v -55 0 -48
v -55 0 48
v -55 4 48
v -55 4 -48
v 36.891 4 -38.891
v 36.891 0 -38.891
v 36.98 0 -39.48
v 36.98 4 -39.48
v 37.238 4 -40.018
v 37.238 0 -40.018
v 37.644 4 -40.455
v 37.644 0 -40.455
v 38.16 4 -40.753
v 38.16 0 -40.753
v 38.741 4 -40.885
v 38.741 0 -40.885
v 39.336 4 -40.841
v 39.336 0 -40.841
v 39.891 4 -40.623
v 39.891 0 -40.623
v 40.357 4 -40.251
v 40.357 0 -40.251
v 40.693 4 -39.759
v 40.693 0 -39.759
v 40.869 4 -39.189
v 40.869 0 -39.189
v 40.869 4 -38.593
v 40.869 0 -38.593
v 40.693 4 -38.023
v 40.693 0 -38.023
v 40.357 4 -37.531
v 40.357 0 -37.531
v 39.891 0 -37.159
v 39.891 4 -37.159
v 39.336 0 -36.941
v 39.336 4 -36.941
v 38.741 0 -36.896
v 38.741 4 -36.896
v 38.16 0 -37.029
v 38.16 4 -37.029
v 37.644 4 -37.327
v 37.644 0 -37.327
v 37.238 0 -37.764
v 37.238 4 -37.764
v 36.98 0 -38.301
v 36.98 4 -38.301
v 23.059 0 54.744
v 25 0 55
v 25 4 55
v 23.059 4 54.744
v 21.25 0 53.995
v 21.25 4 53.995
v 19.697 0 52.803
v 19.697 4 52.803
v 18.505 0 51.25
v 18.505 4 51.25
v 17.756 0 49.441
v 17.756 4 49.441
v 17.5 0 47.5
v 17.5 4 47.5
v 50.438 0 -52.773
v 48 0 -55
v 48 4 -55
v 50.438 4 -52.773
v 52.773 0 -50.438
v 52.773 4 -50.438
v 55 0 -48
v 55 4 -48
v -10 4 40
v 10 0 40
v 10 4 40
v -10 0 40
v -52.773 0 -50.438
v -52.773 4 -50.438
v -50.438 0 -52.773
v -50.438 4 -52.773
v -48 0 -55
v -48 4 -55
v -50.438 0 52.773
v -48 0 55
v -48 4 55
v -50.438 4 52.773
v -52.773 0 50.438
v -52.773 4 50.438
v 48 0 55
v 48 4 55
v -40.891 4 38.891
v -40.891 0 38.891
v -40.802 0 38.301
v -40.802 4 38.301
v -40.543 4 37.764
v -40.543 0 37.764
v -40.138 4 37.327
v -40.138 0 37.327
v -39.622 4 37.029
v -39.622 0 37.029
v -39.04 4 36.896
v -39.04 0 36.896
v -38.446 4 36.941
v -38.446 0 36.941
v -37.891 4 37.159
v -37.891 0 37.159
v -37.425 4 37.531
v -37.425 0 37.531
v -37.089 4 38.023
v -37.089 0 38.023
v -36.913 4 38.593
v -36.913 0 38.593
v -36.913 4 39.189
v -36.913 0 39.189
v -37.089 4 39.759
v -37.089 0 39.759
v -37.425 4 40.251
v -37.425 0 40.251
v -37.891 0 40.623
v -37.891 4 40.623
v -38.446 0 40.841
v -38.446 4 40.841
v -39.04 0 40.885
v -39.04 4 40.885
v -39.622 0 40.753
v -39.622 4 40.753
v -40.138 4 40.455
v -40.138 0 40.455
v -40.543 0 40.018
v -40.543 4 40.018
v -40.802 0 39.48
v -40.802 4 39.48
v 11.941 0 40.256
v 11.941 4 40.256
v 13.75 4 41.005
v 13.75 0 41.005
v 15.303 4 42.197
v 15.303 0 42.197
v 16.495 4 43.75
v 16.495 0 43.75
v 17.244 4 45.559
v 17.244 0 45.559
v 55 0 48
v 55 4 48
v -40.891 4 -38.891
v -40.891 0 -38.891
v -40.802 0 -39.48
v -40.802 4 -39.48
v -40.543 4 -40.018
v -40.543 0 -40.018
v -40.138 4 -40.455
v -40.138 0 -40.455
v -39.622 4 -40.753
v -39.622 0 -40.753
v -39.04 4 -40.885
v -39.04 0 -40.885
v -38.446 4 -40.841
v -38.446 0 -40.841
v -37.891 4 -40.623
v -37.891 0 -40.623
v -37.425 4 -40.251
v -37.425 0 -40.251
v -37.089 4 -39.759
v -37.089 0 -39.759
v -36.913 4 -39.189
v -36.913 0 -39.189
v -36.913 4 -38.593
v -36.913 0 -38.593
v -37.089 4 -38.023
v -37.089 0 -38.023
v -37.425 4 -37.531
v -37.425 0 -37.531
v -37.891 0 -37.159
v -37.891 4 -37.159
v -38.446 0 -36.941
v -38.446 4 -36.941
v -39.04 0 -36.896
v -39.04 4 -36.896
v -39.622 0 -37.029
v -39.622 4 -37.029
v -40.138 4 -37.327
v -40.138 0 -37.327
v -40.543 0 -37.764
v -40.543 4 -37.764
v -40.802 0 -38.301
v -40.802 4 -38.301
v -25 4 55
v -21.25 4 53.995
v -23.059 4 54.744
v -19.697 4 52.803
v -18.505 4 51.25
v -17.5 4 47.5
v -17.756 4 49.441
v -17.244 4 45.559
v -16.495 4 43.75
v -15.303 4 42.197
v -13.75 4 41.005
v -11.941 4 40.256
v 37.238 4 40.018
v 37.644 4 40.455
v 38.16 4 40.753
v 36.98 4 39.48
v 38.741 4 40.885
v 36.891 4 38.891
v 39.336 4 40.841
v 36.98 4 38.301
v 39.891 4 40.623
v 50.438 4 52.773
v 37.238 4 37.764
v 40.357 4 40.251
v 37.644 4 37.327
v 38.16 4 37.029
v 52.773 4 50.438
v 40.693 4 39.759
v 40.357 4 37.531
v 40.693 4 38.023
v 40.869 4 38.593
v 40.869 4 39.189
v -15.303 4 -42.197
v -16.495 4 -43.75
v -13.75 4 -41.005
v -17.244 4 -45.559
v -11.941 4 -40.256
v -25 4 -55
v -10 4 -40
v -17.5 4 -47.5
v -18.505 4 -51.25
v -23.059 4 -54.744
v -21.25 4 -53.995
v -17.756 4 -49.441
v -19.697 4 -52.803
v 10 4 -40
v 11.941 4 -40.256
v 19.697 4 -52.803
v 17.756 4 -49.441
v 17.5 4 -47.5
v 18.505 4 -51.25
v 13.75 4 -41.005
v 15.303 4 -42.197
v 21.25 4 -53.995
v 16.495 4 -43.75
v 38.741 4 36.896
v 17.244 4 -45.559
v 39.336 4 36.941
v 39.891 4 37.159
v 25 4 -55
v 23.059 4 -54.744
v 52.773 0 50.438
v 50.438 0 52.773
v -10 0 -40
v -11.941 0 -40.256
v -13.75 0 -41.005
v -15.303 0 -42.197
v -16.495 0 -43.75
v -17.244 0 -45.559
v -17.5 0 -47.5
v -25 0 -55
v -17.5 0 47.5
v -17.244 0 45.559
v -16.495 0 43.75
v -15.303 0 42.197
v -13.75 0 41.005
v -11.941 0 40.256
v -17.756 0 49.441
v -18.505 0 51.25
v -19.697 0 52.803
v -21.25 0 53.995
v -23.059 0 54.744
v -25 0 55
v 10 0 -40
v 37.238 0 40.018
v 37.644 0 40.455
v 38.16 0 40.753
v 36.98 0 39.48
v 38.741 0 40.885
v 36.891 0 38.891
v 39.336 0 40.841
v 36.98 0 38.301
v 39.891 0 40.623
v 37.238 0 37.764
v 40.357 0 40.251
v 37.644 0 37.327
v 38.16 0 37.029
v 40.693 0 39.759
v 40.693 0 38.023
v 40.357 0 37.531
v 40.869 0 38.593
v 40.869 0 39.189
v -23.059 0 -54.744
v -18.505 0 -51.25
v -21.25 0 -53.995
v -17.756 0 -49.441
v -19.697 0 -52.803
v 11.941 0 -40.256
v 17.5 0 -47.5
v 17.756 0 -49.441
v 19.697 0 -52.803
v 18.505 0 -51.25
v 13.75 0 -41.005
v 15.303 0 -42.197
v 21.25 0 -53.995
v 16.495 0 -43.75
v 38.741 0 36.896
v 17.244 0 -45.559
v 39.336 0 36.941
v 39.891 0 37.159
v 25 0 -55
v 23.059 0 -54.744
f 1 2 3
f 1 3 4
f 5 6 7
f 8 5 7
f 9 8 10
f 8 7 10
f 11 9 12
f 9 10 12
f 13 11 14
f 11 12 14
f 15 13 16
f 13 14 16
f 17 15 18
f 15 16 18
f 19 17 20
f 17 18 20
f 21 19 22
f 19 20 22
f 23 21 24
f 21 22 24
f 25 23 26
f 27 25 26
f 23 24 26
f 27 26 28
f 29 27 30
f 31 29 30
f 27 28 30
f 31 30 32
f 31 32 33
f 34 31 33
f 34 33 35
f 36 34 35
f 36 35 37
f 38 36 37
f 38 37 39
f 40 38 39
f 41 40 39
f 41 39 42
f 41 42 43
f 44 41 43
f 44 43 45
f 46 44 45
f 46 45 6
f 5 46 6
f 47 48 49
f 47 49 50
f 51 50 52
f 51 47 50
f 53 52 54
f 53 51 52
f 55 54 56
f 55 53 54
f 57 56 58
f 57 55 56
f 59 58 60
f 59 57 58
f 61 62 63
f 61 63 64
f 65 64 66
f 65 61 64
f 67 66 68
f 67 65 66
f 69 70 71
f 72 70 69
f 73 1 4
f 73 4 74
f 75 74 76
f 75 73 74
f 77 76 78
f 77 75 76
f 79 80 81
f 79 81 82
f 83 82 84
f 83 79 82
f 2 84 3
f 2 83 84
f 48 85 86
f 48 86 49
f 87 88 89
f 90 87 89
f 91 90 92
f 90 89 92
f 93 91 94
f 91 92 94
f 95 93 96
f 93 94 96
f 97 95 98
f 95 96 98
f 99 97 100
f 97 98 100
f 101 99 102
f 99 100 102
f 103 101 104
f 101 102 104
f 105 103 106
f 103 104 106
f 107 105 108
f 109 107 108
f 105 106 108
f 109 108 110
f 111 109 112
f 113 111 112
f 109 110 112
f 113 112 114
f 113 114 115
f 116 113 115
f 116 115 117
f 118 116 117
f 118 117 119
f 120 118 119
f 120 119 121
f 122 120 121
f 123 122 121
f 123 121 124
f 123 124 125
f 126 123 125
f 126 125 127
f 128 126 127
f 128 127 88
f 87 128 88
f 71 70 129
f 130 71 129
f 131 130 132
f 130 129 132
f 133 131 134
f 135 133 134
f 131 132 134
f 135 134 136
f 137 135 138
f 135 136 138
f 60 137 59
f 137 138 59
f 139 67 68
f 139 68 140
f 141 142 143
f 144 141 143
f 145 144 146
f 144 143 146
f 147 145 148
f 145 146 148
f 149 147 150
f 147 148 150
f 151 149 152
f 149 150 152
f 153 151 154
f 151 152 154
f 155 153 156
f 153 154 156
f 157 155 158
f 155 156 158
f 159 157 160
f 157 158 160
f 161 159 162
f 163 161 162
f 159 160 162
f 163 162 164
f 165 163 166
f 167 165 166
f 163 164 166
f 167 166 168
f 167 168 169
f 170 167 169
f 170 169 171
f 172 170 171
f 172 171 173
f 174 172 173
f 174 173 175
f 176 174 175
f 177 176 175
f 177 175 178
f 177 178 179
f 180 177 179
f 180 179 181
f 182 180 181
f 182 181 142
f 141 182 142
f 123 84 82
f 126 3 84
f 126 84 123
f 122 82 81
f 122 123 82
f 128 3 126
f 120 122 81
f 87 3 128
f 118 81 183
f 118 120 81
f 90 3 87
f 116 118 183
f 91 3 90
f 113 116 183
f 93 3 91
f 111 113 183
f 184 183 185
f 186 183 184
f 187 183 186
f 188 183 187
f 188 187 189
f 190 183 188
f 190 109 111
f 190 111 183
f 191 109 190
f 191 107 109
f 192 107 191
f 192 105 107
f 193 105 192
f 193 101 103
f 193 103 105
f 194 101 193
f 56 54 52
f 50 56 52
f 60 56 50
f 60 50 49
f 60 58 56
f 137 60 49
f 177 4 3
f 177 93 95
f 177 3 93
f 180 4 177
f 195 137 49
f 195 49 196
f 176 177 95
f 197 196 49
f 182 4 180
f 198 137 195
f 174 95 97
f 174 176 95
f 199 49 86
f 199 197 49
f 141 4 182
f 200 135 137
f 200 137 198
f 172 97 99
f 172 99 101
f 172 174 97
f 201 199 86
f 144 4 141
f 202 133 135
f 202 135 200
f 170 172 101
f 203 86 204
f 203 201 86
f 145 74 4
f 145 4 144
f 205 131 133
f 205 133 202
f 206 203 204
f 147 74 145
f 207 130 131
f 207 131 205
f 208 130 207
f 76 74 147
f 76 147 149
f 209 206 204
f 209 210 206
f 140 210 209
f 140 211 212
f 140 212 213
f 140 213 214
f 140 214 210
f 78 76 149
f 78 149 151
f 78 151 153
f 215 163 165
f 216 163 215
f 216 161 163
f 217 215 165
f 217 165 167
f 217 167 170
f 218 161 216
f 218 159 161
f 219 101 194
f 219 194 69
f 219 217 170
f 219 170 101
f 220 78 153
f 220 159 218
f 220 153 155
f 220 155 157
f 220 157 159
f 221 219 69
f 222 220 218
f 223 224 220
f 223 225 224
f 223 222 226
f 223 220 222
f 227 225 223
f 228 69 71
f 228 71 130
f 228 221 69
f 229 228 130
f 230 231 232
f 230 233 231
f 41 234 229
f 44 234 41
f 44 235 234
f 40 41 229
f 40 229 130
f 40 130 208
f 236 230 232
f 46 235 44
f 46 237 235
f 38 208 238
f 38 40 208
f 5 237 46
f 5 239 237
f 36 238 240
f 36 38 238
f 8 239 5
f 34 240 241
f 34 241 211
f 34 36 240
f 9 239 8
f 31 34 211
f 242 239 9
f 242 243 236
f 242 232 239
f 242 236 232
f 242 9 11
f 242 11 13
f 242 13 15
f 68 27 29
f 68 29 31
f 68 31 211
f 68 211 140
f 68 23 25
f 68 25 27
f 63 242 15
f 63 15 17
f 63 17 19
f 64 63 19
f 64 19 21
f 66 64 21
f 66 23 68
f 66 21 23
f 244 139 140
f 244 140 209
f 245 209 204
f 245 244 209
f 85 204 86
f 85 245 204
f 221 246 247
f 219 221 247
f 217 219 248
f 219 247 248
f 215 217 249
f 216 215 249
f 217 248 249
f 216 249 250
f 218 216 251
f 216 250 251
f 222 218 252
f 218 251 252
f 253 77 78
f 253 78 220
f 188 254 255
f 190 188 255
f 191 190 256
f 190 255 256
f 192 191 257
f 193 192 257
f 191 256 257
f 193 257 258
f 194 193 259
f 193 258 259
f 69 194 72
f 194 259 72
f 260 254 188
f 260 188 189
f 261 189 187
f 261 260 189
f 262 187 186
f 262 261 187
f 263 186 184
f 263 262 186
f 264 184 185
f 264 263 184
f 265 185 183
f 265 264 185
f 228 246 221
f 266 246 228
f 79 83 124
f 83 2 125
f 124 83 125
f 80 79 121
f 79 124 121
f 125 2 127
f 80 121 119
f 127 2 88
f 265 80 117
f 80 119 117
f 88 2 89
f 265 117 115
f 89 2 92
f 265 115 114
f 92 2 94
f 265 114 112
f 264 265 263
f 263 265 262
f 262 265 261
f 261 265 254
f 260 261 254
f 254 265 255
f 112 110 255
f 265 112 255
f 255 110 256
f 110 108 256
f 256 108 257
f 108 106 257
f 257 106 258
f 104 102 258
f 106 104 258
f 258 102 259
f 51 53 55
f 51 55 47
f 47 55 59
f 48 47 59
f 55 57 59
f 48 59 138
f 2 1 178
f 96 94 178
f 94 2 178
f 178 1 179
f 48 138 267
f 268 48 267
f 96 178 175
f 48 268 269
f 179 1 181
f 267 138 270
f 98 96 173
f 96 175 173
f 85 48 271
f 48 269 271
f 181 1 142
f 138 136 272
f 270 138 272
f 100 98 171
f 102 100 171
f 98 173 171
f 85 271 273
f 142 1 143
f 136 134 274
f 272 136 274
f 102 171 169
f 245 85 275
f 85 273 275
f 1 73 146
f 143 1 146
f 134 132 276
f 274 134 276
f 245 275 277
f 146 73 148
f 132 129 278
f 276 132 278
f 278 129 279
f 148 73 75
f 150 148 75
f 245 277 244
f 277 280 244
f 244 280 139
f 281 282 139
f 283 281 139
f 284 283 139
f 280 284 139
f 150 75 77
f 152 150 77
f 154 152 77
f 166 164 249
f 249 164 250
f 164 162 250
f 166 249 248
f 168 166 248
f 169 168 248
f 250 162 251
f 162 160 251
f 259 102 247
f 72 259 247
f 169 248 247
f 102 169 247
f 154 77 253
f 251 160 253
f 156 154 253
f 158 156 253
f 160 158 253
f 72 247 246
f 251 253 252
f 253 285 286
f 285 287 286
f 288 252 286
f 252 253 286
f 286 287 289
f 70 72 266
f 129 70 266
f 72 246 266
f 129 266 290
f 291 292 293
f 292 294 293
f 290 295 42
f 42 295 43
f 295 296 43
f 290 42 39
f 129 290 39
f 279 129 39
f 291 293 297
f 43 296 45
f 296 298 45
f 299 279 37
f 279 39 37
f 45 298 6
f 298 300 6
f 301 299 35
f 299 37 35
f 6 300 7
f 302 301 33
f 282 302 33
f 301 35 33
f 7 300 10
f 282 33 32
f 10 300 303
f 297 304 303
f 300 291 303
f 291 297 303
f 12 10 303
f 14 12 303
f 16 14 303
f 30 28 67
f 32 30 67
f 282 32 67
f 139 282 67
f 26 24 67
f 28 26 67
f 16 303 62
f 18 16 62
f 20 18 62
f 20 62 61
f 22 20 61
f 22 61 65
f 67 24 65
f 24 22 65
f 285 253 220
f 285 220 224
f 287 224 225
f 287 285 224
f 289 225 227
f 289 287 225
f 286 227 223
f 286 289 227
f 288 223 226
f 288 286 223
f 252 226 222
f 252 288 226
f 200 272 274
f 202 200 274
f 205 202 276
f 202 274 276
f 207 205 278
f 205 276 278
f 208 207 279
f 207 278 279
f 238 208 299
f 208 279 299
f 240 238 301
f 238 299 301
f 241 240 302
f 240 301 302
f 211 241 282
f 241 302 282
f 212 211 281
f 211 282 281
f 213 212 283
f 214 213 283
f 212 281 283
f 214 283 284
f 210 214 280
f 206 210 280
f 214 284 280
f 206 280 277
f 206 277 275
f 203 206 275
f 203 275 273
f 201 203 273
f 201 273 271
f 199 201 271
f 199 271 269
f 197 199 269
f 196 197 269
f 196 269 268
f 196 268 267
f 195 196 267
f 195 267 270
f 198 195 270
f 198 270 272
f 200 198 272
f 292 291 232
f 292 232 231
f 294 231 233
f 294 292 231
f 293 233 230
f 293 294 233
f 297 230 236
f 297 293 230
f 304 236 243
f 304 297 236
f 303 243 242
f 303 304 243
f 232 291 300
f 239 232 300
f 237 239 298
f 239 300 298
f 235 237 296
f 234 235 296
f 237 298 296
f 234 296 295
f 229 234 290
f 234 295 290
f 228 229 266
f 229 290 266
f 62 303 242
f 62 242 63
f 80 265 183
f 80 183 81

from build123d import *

# Parameters (mm, degrees)
BOSS_EXTRUDE1_DEPTH   = 4
F_4_0MM_DOWEL_HOLE2_D = 4
FILLET1_START         = -1
FILLET1_DEPTH         = 6
FILLET1_2_DEPTH       = 4


with BuildPart() as part:
    # Sketch1 → Boss-Extrude1 (new body)
    with BuildSketch(Plane(origin=(0, 0, 0), x_dir=(1, 0, 0), z_dir=(0, 1, 0))):
        with BuildLine():
            Line((55, 48), (55, -48))
            ThreePointArc((55, -48), (51.618795027, -51.618795027), (48, -55))
            Line((48, -55), (17.5, -55))
            Line((17.5, -55), (17.5, -40))
            Line((17.5, -40), (-17.5, -40))
            Line((-17.5, -40), (-17.5, -55))
            Line((-17.5, -55), (-48, -55))
            ThreePointArc((-48, -55), (-51.618795027, -51.618795027), (-55, -48))
            Line((-55, -48), (-55, 48))
            ThreePointArc((-55, 48), (-51.618795027, 51.618795027), (-48, 55))
            Line((-48, 55), (-17.5, 55))
            Line((-17.5, 55), (-17.5, 40))
            Line((-17.5, 40), (17.5, 40))
            Line((17.5, 40), (17.5, 55))
            Line((17.5, 55), (48, 55))
            ThreePointArc((48, 55), (51.618795027, 51.618795027), (55, 48))
        make_face()
    extrude(amount=BOSS_EXTRUDE1_DEPTH)

    # Ø4.0mm Dowel Hole2 (through all)
    with Locations(Plane(origin=(0, 4, 0), x_dir=(1, 0, 0), z_dir=(0, 1, 0))):
        with Locations((38.890872965, 38.890872965), (38.890872965, -38.890872965), (-38.890872965, -38.890872965), (-38.890872965, 38.890872965)):
            Hole(F_4_0MM_DOWEL_HOLE2_D / 2)

    # Fillet1: read off the stored shape, not the designer's step
    # Fillet1 outline → Fillet1 (cut)
    with BuildSketch(Plane(origin=(0, 0, 0), x_dir=(1, 0, 0), z_dir=(0, 1, 0)).offset(FILLET1_START)):
        with BuildLine():
            Line((17.5, 55), (17.5, 47.5))
            ThreePointArc((17.5, 47.5), (19.696699141, 52.803300859), (25, 55))
            Line((25, 55), (17.5, 55))
        make_face()
        with BuildLine():
            ThreePointArc((-25, 55), (-19.696699141, 52.803300859), (-17.5, 47.5))
            Line((-17.5, 47.5), (-17.5, 55))
            Line((-17.5, 55), (-25, 55))
        make_face()
        with BuildLine():
            Line((-17.5, -55), (-17.5, -47.5))
            ThreePointArc((-17.5, -47.5), (-19.696699141, -52.803300859), (-25, -55))
            Line((-25, -55), (-17.5, -55))
        make_face()
        with BuildLine():
            ThreePointArc((25, -55), (19.696699141, -52.803300859), (17.5, -47.5))
            Line((17.5, -47.5), (17.5, -55))
            Line((17.5, -55), (25, -55))
        make_face()
    extrude(amount=FILLET1_DEPTH, mode=Mode.SUBTRACT)

    # Fillet1 2 outline → Fillet1 2 (add)
    with BuildSketch(Plane(origin=(0, 0, 0), x_dir=(1, 0, 0), z_dir=(0, 1, 0))):
        with BuildLine():
            Line((-17.5, 40), (-10, 40))
            ThreePointArc((-10, 40), (-15.303300859, 42.196699141), (-17.5, 47.5))
            Line((-17.5, 47.5), (-17.5, 40))
        make_face()
        with BuildLine():
            ThreePointArc((17.5, 47.5), (15.303300859, 42.196699141), (10, 40))
            Line((10, 40), (17.5, 40))
            Line((17.5, 40), (17.5, 47.5))
        make_face()
        with BuildLine():
            Line((17.5, -40), (10, -40))
            ThreePointArc((10, -40), (15.303300859, -42.196699141), (17.5, -47.5))
            Line((17.5, -47.5), (17.5, -40))
        make_face()
        with BuildLine():
            ThreePointArc((-17.5, -47.5), (-15.303300859, -42.196699141), (-10, -40))
            Line((-10, -40), (-17.5, -40))
            Line((-17.5, -40), (-17.5, -47.5))
        make_face()
    extrude(amount=FILLET1_2_DEPTH)


solid = part.part
